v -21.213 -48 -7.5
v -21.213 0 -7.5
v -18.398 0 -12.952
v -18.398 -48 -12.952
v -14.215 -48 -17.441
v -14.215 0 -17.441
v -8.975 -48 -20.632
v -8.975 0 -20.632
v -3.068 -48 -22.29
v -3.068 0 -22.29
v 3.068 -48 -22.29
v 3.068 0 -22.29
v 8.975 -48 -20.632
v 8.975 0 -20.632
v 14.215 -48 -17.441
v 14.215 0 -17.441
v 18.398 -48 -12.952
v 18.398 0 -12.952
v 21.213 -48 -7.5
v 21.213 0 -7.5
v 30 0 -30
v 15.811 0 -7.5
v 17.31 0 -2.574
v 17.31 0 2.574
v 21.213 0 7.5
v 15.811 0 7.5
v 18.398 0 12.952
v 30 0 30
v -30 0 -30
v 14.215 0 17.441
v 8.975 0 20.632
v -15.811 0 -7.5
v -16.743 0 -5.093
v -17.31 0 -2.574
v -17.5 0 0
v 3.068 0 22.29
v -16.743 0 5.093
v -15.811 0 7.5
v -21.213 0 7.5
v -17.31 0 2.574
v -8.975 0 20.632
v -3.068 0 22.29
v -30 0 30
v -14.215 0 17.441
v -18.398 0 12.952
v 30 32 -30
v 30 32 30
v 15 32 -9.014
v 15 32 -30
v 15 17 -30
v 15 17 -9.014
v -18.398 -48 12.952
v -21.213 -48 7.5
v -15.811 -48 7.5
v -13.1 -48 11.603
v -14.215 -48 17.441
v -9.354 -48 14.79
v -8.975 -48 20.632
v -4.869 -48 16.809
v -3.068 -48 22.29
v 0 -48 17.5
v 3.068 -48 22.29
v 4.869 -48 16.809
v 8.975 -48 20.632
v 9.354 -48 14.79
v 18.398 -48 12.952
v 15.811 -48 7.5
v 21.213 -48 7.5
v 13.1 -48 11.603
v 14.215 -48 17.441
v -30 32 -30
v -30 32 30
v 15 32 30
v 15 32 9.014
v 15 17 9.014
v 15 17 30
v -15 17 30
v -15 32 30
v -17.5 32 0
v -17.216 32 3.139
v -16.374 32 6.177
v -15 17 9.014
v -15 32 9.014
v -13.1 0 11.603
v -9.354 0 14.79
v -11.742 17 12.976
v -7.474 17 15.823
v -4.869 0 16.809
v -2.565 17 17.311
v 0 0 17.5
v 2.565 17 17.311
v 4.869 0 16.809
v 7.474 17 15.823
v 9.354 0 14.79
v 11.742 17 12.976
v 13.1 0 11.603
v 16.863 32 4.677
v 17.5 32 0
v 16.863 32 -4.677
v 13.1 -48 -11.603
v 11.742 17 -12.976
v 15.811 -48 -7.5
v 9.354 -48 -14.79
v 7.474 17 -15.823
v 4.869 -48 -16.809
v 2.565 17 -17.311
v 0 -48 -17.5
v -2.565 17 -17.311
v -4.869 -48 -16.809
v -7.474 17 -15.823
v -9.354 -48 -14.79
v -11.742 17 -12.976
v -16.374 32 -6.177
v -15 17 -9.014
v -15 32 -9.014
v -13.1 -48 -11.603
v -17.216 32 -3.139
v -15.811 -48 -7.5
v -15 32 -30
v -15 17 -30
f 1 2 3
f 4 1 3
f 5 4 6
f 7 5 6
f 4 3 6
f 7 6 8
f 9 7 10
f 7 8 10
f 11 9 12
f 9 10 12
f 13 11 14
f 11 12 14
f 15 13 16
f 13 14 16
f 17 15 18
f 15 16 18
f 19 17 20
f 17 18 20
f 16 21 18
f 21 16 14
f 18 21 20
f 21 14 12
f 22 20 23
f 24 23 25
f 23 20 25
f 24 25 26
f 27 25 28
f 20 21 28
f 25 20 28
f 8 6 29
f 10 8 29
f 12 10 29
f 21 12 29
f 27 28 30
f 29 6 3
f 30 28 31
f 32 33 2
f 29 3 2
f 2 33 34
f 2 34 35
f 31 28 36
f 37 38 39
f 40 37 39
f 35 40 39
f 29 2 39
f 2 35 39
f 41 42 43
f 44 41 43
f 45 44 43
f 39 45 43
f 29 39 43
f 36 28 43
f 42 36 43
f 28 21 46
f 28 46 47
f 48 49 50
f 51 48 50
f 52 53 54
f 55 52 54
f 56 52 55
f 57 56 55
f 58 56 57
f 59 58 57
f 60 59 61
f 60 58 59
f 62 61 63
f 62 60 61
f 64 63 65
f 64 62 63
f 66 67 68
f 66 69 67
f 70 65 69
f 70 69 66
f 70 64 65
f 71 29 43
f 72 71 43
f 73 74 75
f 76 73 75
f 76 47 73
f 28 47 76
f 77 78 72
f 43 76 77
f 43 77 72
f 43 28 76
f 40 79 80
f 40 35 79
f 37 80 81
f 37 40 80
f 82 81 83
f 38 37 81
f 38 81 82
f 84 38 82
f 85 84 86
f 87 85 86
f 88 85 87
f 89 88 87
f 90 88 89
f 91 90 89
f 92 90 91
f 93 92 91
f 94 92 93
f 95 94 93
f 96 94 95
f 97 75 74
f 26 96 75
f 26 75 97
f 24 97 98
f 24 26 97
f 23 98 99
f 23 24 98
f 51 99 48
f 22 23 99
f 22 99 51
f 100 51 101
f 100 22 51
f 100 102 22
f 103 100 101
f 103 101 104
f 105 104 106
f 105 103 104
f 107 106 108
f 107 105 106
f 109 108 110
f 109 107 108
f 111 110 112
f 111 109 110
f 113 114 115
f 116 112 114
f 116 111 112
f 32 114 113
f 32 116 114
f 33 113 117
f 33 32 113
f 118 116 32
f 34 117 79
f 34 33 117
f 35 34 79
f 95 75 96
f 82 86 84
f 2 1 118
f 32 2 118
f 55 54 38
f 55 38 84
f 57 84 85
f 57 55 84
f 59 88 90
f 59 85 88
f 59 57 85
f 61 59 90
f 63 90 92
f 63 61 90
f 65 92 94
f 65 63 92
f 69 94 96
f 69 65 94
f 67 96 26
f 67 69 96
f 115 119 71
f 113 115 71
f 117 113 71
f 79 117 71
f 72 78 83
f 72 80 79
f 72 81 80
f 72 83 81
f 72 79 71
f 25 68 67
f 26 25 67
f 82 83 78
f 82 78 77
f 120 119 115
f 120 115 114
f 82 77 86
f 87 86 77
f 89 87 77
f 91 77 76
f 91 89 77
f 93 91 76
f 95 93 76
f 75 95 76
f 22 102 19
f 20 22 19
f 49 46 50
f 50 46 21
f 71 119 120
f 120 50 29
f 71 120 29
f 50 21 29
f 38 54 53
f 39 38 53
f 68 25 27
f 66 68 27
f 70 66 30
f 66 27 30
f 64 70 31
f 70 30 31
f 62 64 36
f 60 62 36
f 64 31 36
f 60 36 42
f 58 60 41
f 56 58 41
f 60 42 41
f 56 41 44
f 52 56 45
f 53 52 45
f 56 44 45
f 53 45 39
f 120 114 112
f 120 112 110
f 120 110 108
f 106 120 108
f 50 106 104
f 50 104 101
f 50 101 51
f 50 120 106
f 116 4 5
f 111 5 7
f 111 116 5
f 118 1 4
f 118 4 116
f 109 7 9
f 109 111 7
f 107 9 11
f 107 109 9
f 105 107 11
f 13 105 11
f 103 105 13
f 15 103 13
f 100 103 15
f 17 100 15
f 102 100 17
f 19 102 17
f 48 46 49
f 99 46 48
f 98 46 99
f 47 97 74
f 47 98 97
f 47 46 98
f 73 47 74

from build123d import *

# Parameters (mm, degrees)
F0_R     = 22.5
F0_R_2   = 17.5
F1_DEPTH = 48
F2_W     = 60
F2_H     = 60
F2_R     = 22.5
F2_R_2   = 17.5
F3_DEPTH = 32
F4_W     = 30
F4_H     = 15
F5_DEPTH = 60.001
F7_DEPTH = 48


with BuildPart() as f1:
    # F0 (on Front) → F1 (new body)
    with BuildSketch(Plane.XZ):
        Circle(F0_R)
        Circle(F0_R_2, mode=Mode.SUBTRACT)
    extrude(amount=F1_DEPTH)

    # F2 (on face) → F3 (join)
    with BuildSketch(Plane(origin=(0, 0, 0), x_dir=(-1, 0, 0), z_dir=(0, 1, 0))):
        Rectangle(F2_W, F2_H)
        Circle(F2_R, mode=Mode.SUBTRACT)
        Circle(F2_R)
        Circle(F2_R_2, mode=Mode.SUBTRACT)
    extrude(amount=F3_DEPTH)

    # F4 (on face) → F5 (cut, through all)
    with BuildSketch(Plane(origin=(0, 0, -30), x_dir=(1, 0, 0), z_dir=(0, 0, -1))):
        with Locations((0, -24.5)):
            Rectangle(F4_W, F4_H)
    extrude(amount=-F5_DEPTH, mode=Mode.SUBTRACT)

    # F6 (on face) → F7 (cut, through all)
    with BuildSketch(Plane.XZ.offset(48)):
        with BuildLine():
            ThreePointArc((-21.2132034356, 7.5), (-22.5, 0), (-21.2132034356, -7.5))
            Line((-21.2132034356, -7.5), (-15.8113883008, -7.5))
            ThreePointArc((-15.8113883008, -7.5), (-17.5, 0), (-15.8113883008, 7.5))
            Line((-15.8113883008, 7.5), (-21.2132034356, 7.5))
        make_face()
        with BuildLine():
            Line((15.8113883008, -7.5), (21.2132034356, -7.5))
            ThreePointArc((21.2132034356, -7.5), (22.1759675922, -3.8047945213), (22.5, 0))
            ThreePointArc((22.5, 0), (22.1759675922, 3.8047945213), (21.2132034356, 7.5))
            Line((21.2132034356, 7.5), (15.8113883008, 7.5))
            ThreePointArc((15.8113883008, 7.5), (17.0726286093, 3.843872054), (17.5, 0))
            ThreePointArc((17.5, 0), (17.0726286093, -3.843872054), (15.8113883008, -7.5))
        make_face()
    extrude(amount=-F7_DEPTH, mode=Mode.SUBTRACT)


solid = f1.part
